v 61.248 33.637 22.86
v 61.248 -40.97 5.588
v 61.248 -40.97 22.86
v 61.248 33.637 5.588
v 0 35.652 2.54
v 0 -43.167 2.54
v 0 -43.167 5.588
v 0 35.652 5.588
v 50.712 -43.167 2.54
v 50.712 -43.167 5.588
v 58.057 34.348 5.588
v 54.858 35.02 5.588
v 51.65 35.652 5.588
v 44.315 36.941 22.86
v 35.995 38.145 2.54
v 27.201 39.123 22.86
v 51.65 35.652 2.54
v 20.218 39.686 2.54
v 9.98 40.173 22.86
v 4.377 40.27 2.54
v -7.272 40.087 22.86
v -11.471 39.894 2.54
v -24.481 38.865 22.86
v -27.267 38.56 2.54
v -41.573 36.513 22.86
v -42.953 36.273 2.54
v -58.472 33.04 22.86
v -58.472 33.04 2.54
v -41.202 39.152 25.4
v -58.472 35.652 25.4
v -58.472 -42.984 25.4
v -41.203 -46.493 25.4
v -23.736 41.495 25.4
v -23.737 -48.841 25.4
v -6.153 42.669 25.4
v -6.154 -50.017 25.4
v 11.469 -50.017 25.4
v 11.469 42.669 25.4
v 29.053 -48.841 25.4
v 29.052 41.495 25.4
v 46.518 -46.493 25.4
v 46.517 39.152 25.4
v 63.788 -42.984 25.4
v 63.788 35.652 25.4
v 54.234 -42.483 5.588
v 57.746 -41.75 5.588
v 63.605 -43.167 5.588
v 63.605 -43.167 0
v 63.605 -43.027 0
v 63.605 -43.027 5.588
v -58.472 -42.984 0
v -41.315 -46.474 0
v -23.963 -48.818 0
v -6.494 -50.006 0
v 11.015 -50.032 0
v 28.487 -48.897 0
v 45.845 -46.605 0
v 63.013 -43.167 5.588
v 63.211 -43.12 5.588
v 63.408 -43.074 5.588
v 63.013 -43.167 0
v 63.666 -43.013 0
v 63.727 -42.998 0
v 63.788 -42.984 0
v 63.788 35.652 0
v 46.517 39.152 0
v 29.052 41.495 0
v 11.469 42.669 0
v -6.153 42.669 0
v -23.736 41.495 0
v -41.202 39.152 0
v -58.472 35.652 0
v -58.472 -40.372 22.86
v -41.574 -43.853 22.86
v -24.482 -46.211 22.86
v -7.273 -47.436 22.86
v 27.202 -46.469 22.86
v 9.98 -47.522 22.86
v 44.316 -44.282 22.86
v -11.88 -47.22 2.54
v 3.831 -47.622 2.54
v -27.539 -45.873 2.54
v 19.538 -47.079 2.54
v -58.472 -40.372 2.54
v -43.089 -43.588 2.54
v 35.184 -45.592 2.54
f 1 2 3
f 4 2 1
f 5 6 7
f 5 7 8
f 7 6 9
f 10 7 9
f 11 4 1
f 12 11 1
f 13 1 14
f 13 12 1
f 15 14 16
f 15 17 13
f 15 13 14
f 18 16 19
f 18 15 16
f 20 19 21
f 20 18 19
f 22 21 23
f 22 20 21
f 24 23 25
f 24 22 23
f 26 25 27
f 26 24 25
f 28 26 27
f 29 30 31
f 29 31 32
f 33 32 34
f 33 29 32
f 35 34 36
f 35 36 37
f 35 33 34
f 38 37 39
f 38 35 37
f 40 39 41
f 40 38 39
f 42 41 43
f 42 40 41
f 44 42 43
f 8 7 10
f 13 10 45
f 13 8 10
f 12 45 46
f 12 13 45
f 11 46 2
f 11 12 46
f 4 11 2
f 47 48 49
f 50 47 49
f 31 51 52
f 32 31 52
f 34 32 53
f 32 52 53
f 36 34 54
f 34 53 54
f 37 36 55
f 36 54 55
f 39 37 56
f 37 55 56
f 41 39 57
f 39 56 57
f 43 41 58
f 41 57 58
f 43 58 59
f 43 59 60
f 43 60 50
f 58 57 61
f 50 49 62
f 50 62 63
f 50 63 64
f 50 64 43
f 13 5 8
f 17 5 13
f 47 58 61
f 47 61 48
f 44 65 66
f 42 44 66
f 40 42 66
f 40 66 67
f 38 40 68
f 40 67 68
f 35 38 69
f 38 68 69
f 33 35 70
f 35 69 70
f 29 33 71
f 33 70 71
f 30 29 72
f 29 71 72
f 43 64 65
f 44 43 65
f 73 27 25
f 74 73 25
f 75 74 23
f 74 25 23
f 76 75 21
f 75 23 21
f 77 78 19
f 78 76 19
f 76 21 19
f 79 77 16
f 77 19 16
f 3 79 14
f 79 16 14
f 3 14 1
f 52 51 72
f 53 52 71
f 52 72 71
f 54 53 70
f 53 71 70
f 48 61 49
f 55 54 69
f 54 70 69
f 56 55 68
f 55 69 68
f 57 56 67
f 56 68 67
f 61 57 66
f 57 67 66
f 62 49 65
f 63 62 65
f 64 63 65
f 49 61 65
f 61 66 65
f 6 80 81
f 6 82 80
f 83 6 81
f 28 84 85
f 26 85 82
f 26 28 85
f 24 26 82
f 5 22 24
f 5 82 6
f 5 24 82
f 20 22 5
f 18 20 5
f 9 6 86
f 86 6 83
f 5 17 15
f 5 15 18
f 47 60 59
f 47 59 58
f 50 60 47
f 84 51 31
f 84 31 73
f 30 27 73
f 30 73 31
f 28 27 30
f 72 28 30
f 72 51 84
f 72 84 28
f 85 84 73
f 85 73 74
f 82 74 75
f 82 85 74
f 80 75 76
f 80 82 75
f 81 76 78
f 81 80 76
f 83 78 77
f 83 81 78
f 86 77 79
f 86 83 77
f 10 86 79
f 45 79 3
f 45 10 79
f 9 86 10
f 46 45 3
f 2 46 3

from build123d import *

# Parameters (mm, degrees)
F0_W     = 122.2604140639
F0_H     = 78.6352567375
F2_DEPTH = 25.4
F3_T     = -2.54
F1_W     = 63.6047422886
F1_H     = 78.8185559213
F4_DEPTH = 5.588
F5_R     = 1.6394762834
F6_DEPTH = 28.194
F5_R_2   = 1.6394765438
F7_DEPTH = 32.258


# Not quite as in the source:
# - the program builds the solid bodies; features that only make, move or delete a surface that nothing else refers to are left out


with BuildPart() as f2:
    # F0 (on Top) → F2 (new body)
    with BuildSketch(Plane.XY):
        with BuildLine():
            ThreePointArc((63.7880414724, 35.6516502798), (2.6578344405, 42.8155765092), (-58.4723725915, 35.6516502798))
            Line((-58.4723725915, 35.6516502798), (63.7880414724, 35.6516502798))
        make_face()
        with Locations((2.6578344405, -3.665978089)):
            Rectangle(F0_W, F0_H)
        with BuildLine():
            Line((63.7880414724, -42.9836064577), (-58.4723725915, -42.9836064577))
            ThreePointArc((-58.4723725915, -42.9836064577), (2.6578344405, -50.1645132958), (63.7880414724, -42.9836064577))
        make_face()
    extrude(amount=F2_DEPTH)

    # F3
    f3_openings = [f2.faces().sort_by_distance(p)[0] for p in [
        (-58.472373, -3.665978, 12.7),
    ]]
    offset(amount=F3_T, openings=f3_openings)

    # F1 (on Top) → F4 (join)
    with BuildSketch(Plane.XY):
        with Locations((31.8023711443, -3.7576276809)):
            Rectangle(F1_W, F1_H)
    extrude(amount=F4_DEPTH)

    # F5 (on Front) → F6 (cut)
    with BuildSketch(Plane.XZ):
        with Locations((-47.8410311043, 4.857422784)):
            Circle(F5_R)
    extrude(amount=-F6_DEPTH, mode=Mode.SUBTRACT)

    # F5 (on Front) → F7 (cut)
    with BuildSketch(Plane.XZ):
        with Locations((-13.1975244731, 4.857422784)):
            Circle(F5_R_2)
        with Locations((-47.8410311043, 4.857422784)):
            Circle(F5_R)
    extrude(amount=-F7_DEPTH, mode=Mode.SUBTRACT)


solid = f2.part
